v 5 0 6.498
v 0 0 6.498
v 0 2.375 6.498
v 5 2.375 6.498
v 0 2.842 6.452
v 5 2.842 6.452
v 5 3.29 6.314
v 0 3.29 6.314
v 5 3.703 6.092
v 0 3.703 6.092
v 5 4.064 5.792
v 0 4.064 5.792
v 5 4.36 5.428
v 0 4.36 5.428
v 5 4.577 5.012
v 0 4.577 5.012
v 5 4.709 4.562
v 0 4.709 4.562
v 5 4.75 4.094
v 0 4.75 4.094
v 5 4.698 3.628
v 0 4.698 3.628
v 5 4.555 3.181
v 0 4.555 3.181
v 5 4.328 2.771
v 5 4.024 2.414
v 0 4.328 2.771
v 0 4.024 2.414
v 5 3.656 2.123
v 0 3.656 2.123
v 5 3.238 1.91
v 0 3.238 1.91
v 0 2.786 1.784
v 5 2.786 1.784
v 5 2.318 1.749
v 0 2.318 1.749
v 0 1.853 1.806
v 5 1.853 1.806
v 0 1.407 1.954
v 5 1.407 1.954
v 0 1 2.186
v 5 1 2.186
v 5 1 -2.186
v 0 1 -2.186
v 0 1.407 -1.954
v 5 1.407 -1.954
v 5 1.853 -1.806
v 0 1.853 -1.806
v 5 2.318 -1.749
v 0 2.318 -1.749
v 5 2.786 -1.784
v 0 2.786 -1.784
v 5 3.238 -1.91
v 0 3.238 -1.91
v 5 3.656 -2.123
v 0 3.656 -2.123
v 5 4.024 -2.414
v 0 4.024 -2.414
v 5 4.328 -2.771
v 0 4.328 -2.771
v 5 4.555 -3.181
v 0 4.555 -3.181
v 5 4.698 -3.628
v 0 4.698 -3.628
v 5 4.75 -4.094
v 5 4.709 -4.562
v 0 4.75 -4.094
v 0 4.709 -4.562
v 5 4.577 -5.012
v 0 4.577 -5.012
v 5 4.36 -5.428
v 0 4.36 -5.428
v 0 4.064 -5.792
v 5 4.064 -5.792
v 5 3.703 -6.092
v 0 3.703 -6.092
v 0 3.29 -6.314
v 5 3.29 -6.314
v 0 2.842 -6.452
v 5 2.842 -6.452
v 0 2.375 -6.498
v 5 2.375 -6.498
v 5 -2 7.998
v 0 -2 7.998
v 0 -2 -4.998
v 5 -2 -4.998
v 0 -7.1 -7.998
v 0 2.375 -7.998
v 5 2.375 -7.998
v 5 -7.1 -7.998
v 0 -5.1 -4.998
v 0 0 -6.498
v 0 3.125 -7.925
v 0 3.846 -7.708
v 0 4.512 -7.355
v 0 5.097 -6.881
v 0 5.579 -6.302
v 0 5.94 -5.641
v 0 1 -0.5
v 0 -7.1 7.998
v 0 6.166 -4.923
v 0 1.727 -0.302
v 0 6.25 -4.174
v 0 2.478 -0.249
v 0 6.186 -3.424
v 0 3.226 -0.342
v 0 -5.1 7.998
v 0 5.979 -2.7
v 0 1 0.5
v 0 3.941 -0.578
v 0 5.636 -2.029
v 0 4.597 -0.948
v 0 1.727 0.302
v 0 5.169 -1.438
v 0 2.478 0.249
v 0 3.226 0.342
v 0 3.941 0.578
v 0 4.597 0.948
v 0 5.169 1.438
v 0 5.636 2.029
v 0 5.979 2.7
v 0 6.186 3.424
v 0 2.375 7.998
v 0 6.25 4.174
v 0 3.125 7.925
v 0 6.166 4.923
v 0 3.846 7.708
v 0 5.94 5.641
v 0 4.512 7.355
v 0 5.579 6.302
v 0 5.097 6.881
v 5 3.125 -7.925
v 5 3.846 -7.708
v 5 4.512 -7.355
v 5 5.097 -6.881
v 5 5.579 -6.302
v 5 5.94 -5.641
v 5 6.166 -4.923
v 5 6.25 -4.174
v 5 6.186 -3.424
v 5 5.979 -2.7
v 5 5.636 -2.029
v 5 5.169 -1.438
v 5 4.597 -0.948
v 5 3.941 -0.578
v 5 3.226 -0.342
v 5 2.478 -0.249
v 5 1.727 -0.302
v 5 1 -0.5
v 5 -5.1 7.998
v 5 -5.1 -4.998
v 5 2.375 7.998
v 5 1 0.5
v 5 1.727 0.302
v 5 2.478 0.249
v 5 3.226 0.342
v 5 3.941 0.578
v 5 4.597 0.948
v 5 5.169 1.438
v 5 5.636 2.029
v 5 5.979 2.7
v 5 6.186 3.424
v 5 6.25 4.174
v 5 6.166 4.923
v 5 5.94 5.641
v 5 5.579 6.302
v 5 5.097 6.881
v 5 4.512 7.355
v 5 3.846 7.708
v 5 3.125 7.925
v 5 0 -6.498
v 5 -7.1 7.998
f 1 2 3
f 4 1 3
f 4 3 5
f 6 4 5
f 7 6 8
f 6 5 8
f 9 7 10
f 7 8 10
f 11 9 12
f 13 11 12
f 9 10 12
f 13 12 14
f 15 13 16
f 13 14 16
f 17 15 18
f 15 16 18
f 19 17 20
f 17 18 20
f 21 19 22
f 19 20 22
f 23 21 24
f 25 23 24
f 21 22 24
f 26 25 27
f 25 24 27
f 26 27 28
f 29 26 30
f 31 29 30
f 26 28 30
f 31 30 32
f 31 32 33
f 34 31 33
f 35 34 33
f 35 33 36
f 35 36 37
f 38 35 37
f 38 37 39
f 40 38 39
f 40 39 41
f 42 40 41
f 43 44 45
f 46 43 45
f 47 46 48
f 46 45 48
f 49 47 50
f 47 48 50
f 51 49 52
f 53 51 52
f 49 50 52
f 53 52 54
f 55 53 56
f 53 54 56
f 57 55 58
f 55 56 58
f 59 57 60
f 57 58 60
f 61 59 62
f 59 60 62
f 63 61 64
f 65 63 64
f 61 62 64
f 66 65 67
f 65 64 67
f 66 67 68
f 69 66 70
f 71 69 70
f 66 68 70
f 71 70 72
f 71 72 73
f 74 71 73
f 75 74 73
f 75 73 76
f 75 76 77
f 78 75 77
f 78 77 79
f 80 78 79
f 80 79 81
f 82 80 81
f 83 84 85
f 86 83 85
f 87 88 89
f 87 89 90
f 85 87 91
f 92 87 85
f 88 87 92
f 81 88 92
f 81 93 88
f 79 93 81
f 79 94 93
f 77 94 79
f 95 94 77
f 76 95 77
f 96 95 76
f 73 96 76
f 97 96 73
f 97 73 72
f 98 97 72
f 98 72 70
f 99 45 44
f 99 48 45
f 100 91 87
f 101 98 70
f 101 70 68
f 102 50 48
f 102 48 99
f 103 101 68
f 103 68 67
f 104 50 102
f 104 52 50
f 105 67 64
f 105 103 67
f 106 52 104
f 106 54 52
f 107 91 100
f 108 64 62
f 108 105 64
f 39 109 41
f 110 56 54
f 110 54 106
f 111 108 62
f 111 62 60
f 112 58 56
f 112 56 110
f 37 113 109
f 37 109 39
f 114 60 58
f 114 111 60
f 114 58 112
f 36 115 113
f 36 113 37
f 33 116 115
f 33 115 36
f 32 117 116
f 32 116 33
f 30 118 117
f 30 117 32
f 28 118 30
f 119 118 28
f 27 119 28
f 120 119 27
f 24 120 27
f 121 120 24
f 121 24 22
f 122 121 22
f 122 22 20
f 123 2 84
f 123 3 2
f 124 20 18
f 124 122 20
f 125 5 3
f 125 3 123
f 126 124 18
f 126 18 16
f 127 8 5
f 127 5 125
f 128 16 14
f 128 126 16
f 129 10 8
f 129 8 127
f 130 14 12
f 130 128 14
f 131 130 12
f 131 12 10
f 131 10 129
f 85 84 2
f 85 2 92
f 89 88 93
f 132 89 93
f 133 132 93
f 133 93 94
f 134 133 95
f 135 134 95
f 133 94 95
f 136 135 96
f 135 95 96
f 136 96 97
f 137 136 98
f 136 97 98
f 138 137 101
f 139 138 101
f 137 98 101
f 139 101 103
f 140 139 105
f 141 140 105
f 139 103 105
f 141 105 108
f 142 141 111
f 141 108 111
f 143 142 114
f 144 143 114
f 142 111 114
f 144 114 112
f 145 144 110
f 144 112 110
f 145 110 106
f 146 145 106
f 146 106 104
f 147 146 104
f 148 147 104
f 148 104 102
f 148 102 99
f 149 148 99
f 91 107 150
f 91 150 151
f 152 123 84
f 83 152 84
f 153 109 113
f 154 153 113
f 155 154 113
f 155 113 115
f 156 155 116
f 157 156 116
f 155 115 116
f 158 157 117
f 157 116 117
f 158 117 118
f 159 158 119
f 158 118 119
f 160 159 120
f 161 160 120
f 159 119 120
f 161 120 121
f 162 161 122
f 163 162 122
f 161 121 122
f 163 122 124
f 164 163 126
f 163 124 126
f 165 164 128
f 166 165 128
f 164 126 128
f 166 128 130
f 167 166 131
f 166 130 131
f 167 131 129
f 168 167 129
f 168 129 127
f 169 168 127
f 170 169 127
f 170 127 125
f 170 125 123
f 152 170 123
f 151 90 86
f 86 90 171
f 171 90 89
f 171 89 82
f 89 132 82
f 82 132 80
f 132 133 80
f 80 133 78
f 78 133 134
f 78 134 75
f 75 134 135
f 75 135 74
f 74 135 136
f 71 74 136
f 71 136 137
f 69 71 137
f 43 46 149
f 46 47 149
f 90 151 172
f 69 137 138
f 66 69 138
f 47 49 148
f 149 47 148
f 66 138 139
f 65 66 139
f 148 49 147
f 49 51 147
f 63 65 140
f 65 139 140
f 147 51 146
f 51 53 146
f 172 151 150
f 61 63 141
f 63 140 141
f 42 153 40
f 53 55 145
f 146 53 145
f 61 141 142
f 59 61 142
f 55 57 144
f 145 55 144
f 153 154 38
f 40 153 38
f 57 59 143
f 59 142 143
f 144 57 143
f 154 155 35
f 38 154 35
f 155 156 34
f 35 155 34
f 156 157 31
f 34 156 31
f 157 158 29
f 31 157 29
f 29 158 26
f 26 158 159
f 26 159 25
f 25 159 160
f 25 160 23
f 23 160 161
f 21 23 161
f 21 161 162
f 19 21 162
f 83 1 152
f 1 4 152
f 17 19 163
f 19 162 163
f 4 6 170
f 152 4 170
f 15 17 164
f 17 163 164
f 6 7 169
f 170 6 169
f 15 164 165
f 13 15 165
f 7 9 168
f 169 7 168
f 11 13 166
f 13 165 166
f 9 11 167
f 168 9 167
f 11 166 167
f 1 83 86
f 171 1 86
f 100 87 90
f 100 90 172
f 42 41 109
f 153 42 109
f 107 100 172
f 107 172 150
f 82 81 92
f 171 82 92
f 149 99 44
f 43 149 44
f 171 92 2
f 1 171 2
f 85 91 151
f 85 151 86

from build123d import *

# Parameters (mm, degrees)
BOSS_EXTRUDE1_DEPTH = 5
BOSS_EXTRUDE2_DEPTH = 5


with BuildPart() as part:
    # Sketch1 → Boss-Extrude1 (new body)
    with BuildSketch(Plane(origin=(0, 0, 0), x_dir=(0, 0, -1), z_dir=(1, 0, 0))):
        with BuildLine():
            Line((-7.997844187, 2.375), (-7.997844187, -2))
            Line((-7.997844187, -2), (7.997844187, -2))
            Line((7.997844187, -2), (7.997844187, 2.375))
            ThreePointArc((7.997844187, 2.375), (3.423879317, 6.186439769), (0.5, 1))
            Line((0.5, 1), (2.186352513, 1))
            ThreePointArc((2.186352513, 1), (3.401228889, 4.637718799), (6.497844187, 2.375))
            Line((6.497844187, 2.375), (6.497844187, 0))
            Line((6.497844187, 0), (-6.497844187, 0))
            Line((-6.497844187, 0), (-6.497844187, 2.375))
            ThreePointArc((-6.497844187, 2.375), (-3.401228889, 4.637718799), (-2.186352513, 1))
            Line((-2.186352513, 1), (-0.5, 1))
            ThreePointArc((-0.5, 1), (-3.423879317, 6.186439769), (-7.997844187, 2.375))
        make_face()
    extrude(amount=BOSS_EXTRUDE1_DEPTH)

    # Sketch2 → Boss-Extrude2 (add)
    with BuildSketch(Plane.ZY):
        Polygon((-7.997844187, -2), (-7.997844187, -7.1), (7.997844187, -7.1), (7.997844187, -5.1), (-4.997844187, -5.1), (-4.997844187, -2), align=None)
    extrude(amount=-BOSS_EXTRUDE2_DEPTH)


solid = part.part
